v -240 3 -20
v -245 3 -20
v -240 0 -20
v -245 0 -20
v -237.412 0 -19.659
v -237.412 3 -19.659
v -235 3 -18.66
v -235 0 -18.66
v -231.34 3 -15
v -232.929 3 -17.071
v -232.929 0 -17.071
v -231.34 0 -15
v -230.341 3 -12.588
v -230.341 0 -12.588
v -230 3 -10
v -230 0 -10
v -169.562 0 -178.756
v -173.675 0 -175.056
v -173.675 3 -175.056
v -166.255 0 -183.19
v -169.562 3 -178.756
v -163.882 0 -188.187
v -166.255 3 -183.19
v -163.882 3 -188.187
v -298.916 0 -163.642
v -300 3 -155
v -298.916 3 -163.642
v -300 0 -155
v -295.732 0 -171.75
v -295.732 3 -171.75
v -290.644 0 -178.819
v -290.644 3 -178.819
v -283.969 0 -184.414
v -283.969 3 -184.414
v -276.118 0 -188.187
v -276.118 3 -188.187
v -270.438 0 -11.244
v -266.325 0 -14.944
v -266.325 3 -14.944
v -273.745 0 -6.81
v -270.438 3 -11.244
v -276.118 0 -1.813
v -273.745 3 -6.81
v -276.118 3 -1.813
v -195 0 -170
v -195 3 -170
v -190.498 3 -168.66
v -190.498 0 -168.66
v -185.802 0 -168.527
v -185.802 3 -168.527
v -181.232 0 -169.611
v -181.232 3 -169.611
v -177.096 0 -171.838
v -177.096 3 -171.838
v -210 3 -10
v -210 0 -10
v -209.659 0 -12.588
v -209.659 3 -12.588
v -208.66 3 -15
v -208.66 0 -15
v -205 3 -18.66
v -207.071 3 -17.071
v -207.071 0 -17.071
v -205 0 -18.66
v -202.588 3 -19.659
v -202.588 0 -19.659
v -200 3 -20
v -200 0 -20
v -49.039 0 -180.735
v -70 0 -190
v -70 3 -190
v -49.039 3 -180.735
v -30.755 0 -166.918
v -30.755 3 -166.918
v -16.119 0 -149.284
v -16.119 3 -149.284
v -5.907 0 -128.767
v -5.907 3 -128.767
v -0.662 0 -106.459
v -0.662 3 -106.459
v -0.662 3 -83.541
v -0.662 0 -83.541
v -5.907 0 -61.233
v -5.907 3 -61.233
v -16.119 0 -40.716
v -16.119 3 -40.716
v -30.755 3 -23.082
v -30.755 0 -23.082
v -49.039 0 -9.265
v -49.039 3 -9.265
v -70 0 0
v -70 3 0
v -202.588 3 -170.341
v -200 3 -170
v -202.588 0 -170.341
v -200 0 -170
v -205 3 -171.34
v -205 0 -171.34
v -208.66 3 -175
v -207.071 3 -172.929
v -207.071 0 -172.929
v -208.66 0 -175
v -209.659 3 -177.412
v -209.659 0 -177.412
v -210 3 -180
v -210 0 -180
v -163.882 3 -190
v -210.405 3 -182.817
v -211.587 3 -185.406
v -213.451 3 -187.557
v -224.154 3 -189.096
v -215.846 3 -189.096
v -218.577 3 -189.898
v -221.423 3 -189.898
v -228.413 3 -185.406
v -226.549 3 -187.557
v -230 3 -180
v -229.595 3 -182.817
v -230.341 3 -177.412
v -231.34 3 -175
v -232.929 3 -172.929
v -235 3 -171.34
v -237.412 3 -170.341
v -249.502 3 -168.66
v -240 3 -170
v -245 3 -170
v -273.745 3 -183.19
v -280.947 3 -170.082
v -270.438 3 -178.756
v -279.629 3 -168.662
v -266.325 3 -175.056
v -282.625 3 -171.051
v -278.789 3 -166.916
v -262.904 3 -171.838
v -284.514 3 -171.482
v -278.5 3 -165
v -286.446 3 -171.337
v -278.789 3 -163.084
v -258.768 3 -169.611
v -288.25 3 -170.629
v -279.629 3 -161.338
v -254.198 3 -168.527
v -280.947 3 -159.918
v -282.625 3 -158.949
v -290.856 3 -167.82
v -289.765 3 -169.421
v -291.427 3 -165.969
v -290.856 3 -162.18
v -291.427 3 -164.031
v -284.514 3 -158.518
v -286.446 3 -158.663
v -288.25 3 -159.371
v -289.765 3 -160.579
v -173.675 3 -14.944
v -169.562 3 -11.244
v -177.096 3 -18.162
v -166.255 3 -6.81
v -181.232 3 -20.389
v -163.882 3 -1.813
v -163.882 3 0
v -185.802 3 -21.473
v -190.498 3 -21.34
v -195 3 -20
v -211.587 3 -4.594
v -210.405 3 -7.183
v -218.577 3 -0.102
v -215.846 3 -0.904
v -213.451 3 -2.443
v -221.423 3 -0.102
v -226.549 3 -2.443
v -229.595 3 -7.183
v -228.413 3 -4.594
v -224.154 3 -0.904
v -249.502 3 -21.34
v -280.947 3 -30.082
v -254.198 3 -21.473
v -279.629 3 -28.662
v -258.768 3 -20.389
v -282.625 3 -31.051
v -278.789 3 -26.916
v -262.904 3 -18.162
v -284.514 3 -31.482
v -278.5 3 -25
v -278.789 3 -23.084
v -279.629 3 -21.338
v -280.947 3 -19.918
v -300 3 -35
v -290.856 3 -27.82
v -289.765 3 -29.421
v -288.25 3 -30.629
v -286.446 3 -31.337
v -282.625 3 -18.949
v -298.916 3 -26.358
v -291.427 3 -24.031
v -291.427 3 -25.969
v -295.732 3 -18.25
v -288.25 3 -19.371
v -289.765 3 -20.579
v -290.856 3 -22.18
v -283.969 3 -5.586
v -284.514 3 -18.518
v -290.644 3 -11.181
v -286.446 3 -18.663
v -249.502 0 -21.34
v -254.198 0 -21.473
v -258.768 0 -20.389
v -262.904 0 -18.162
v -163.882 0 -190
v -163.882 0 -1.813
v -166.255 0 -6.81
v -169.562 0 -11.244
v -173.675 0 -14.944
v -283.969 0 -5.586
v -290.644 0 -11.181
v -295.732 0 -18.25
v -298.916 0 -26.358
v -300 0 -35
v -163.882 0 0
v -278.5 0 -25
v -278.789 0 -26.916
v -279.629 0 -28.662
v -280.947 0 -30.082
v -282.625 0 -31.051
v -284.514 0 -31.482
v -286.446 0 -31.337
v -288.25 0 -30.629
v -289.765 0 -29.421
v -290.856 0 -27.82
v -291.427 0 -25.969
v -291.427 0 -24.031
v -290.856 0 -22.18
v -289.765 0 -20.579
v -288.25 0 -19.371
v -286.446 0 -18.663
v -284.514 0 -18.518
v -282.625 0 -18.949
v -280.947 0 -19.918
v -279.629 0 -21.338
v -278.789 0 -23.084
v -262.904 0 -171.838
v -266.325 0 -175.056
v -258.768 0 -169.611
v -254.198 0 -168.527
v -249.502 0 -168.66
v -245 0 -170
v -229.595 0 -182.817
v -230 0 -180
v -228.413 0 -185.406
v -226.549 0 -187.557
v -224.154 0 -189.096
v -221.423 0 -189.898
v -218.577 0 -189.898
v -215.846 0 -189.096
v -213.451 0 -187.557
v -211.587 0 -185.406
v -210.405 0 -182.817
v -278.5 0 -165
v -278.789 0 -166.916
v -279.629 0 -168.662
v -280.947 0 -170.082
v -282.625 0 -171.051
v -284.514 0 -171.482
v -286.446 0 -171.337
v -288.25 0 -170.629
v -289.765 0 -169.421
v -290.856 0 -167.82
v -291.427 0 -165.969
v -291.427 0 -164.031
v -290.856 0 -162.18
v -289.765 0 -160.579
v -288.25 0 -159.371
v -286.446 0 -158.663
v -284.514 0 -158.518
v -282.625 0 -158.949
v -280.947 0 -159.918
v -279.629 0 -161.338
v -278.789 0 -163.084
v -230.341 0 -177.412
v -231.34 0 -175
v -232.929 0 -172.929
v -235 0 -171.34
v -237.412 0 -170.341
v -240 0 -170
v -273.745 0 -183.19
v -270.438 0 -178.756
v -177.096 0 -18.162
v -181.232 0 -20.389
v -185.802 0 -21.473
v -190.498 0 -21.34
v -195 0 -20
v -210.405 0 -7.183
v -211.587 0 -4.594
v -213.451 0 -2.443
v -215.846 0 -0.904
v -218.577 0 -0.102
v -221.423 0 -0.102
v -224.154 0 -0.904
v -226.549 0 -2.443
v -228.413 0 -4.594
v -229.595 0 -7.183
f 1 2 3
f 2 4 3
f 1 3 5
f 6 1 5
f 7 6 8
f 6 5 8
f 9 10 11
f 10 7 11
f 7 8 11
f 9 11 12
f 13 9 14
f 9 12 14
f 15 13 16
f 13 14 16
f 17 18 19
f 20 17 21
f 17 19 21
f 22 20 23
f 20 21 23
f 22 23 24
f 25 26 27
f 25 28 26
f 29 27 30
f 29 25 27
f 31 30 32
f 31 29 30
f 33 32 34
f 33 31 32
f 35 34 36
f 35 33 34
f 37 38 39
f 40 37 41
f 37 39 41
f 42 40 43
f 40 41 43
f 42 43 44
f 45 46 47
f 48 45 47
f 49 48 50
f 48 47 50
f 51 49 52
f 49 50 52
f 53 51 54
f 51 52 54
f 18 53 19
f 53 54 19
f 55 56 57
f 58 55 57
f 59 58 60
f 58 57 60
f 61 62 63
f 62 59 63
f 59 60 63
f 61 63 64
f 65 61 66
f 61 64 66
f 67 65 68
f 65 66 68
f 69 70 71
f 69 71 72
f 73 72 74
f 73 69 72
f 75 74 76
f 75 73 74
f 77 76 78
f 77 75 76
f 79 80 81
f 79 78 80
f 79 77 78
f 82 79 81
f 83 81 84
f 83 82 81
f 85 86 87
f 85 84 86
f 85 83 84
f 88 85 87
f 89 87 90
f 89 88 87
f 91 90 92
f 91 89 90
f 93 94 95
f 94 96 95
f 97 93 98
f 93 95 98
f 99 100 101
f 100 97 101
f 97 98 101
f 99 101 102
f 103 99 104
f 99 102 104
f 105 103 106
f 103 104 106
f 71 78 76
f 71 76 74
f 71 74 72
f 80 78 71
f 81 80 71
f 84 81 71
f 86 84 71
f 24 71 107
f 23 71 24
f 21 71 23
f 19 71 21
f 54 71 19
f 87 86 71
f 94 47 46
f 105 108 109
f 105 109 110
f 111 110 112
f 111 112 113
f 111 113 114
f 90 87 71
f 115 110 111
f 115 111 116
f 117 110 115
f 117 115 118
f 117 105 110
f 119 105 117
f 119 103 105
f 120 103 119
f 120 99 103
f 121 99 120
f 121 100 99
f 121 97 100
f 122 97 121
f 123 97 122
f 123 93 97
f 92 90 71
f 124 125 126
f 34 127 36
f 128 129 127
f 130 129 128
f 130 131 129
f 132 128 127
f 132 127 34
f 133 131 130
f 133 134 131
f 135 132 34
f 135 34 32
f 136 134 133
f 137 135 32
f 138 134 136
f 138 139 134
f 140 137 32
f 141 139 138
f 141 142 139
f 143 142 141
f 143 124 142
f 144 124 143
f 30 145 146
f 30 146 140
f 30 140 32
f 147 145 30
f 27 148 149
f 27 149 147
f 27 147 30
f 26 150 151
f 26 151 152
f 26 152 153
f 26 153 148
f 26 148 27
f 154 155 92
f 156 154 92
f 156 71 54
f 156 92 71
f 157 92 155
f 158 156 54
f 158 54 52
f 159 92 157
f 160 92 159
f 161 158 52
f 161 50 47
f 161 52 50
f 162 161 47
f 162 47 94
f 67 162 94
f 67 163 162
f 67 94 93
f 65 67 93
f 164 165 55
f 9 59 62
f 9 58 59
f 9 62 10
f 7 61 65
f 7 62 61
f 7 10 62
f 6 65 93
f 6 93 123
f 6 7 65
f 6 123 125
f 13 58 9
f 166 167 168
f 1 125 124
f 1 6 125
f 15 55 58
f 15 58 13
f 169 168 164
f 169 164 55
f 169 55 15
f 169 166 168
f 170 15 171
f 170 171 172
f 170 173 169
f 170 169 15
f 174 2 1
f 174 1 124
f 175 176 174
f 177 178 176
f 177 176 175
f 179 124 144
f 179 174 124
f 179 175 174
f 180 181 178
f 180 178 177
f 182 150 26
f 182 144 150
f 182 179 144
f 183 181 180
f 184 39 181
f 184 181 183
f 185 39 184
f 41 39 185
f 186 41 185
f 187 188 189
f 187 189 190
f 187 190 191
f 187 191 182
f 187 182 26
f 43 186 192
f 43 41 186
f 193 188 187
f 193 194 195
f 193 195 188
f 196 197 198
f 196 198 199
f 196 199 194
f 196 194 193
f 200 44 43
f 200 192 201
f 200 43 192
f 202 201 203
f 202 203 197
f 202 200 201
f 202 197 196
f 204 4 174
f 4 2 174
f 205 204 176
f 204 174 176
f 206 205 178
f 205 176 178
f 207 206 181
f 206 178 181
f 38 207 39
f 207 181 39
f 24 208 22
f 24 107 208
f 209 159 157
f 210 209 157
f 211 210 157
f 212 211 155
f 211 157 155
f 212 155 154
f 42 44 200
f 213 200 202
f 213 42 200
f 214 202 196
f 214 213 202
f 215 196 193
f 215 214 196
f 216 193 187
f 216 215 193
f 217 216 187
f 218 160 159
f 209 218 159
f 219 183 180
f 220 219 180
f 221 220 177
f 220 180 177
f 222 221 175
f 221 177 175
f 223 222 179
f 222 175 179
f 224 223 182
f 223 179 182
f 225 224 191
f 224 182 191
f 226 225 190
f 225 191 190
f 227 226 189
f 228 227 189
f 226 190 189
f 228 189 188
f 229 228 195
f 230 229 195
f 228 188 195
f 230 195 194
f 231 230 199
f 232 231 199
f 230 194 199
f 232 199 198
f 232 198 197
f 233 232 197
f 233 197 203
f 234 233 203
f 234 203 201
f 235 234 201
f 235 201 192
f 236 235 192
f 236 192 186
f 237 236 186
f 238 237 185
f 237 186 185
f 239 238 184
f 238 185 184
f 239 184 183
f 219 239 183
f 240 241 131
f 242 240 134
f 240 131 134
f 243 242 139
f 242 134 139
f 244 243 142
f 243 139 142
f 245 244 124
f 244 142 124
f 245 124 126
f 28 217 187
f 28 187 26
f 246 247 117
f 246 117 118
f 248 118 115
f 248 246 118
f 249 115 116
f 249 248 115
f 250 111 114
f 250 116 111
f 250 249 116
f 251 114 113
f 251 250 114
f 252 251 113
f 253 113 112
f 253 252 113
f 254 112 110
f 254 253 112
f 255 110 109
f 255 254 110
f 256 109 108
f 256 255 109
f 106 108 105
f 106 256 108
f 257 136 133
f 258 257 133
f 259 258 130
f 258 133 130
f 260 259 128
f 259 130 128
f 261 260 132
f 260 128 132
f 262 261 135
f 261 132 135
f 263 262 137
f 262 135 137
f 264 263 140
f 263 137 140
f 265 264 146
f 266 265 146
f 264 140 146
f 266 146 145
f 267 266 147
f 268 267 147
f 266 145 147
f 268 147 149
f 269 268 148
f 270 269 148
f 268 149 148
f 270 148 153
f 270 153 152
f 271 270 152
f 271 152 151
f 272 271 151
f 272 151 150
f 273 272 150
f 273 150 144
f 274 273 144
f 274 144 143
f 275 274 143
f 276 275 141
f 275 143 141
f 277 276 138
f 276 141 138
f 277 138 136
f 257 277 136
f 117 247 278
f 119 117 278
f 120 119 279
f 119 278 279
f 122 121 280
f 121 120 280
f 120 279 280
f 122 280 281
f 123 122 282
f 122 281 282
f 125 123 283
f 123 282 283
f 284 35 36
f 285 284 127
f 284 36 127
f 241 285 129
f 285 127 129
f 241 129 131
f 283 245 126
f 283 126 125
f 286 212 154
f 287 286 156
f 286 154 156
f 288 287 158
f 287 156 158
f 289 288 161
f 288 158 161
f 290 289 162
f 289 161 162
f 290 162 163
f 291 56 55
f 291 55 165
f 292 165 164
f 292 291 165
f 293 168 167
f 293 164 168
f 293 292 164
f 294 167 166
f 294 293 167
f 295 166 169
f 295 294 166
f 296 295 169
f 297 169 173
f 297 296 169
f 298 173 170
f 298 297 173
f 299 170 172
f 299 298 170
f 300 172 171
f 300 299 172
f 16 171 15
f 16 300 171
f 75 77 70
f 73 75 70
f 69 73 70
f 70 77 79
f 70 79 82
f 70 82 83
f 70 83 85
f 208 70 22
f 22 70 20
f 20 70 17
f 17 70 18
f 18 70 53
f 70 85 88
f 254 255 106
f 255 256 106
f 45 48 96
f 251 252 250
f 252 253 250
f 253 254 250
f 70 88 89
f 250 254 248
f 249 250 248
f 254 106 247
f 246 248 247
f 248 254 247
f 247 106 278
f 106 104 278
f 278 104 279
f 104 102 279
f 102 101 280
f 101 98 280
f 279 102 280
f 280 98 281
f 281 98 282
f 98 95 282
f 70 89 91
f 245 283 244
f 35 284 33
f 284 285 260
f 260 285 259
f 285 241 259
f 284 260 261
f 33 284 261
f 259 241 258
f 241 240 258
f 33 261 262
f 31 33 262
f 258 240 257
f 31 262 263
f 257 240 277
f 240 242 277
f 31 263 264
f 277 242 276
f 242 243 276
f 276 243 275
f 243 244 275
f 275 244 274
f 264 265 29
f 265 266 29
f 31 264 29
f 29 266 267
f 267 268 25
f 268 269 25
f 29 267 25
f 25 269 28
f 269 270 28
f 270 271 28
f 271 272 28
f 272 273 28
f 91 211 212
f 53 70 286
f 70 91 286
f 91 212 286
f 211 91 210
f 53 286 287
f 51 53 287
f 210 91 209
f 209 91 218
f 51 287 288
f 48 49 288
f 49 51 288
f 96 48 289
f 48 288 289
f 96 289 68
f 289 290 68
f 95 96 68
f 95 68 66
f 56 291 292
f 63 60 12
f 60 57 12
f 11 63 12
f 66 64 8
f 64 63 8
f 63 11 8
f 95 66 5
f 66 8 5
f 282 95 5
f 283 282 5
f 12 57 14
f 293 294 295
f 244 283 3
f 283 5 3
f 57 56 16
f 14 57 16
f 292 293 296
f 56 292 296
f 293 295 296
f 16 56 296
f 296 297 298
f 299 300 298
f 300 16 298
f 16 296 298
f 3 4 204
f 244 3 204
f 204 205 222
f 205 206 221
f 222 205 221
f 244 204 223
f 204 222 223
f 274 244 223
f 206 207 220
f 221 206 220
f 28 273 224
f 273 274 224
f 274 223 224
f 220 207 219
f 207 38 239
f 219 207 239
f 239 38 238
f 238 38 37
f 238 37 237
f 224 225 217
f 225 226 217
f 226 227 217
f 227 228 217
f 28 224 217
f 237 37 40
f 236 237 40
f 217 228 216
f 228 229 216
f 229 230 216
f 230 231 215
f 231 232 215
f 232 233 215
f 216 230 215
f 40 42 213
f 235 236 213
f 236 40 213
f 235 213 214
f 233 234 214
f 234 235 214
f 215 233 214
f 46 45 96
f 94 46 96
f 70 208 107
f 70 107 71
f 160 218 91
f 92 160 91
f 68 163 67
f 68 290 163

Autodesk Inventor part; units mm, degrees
ref_plane "YZ Plane" through (0, 0, 0) normal (1, 0, 0) x (0, 1, 0)
ref_plane "XZ Plane" through (0, 0, 0) normal (0, 1, 0) x (-1, 0, 0)
ref_plane "XY Plane" through (0, 0, 0) normal (0, 0, 1) x (1, 0, 0)
sketch "Sketch1" plane through (0, 0, 0) normal (0, 1, 0) x (-1, 0, 0)
  line L0 (300, -35) -> (300, -155)
  line L1 (220, -190) -> (220, -190)
  line L2 (255, -180) -> (255, -180)
  line L3 (245, -170) -> (240, -170)
  line L4 (230, -180) -> (230, -180)
  line L5 (220, -190) -> (220, -190)
  line L6 (185, -180) -> (185, -180)
  line L7 (195, -170) -> (200, -170)
  line L8 (210, -180) -> (210, -180)
  arc A0 (255, -172) -> (253, -170) centre (253, -172) ccw
  arc A1 (255, -180) -> (245, -170) centre (245, -180) ccw
  arc A2 (240, -170) -> (230, -180) centre (240, -180) ccw
  arc A3 (210, -180) -> (220, -190) centre (220, -180) ccw
  arc A4 (220, -190) -> (230, -180) centre (220, -180) ccw
  arc A5 (210, -180) -> (200, -170) centre (200, -180) ccw
  arc A6 (195, -170) -> (185, -180) centre (195, -180) ccw
  arc A7 (175, -190) -> (185, -180) centre (175, -180) ccw
  line L9 (265, -190) -> (265, -190)
  arc A8 (255, -180) -> (265, -190) centre (265, -180) ccw
  line L10 (220, 0) -> (220, 0)
  line L11 (255, -10) -> (255, -10)
  line L12 (245, -20) -> (240, -20)
  line L13 (230, -10) -> (230, -10)
  line L14 (220, 0) -> (220, 0)
  line L15 (185, -10) -> (185, -10)
  line L16 (195, -20) -> (200, -20)
  line L17 (210, -10) -> (210, -10)
  arc A9 (253, -20) -> (255, -18) centre (253, -18) ccw
  arc A10 (245, -20) -> (255, -10) centre (245, -10) ccw
  arc A11 (230, -10) -> (240, -20) centre (240, -10) ccw
  arc A12 (220, 0) -> (210, -10) centre (220, -10) ccw
  arc A13 (230, -10) -> (220, 0) centre (220, -10) ccw
  arc A14 (200, -20) -> (210, -10) centre (200, -10) ccw
  arc A15 (185, -10) -> (195, -20) centre (195, -10) ccw
  arc A16 (185, -10) -> (175, 0) centre (175, -10) ccw
  line L18 (265, 0) -> (265, 0)
  arc A17 (265, 0) -> (255, -10) centre (265, -10) ccw
  arc A18 (265, -190) -> (300, -155) centre (265, -155) ccw
  arc A19 (300, -35) -> (265, 0) centre (265, -35) ccw
  line L19 (175, 0) -> (365, 0) construction
  arc A20 (70, 0) -> (70, -190) centre (99.4643, -95) ccw
  line L20 (175, 0) -> (70, 0)
  line L21 (175, -190) -> (70, -190)
  point P0 (0, 0)
  point P1 (300, -190)
  point P2 (300, 0)
  point P3 (255, -170)
  point P4 (255, -190)
  point P5 (230, -170)
  point P6 (185, -170)
  point P7 (210, -170)
  point P8 (255, -20)
  point P9 (255, 0)
  point P10 (230, -20)
  point P11 (185, -20)
  point P12 (210, -20)
  point P13 (210, -10)
  dimension "d1" = 190
  dimension "d2" = 80
  dimension "d4" = 25
  dimension "d5" = 20
  dimension "d7" = 25
  dimension "d9" = 2
  dimension "d10" = 10
  dimension "d11" = 10
  dimension "d12" = 35
extrude "Extrusion1" add sketch "Sketch1" along normal blind 3
sketch "Sketch2" plane through (0, 3, 0) normal (0, 1, 0) x (1, 0, 0)
  arc A0 (-230, 10) -> (-210, 10) centre (-220, 10) ccw projected
  line L0 (-220, 0) -> (-220, 10)
  point P0 (0, 0)
sketch "Sketch3" plane through (0, 3, 0) normal (0, 1, 0) x (1, 0, 0)
  arc A0 (-245, 20) -> (-255, 10) centre (-245, 10) ccw projected
  arc A1 (-300, 35) -> (-265, 0) centre (-265, 35) ccw projected
  arc A2 (-245, 20) -> (-276.1181, 1.8128) centre (-249.7009, -7.6718) ccw
  line L0 (-276.1181, 1.8128) -> (-248.5566, -2.5367)
  line L1 (-248.5566, -2.5367) -> (-245, 20)
  arc A3 (-230, 10) -> (-210, 10) centre (-220, 10) ccw projected
  line L2 (-220, 0) -> (-220, 190)
  arc A4 (-210, 180) -> (-230, 180) centre (-220, 180) ccw projected
  arc A5 (-163.8819, 1.8128) -> (-195, 20) centre (-190.2991, -7.6718) ccw
  line L3 (-191.4434, -2.5367) -> (-195, 20)
  line L4 (-163.8819, 1.8128) -> (-191.4434, -2.5367)
  line L5 (-220, 95) -> (-300, 95)
  line L6 (-300, 155) -> (-300, 35) projected
  arc A6 (-276.1181, 188.1872) -> (-245, 170) centre (-249.7009, 197.6718) ccw
  line L7 (-276.1181, 188.1872) -> (-248.5566, 192.5367)
  line L8 (-248.5566, 192.5367) -> (-245, 170)
  arc A7 (-195, 170) -> (-163.8819, 188.1872) centre (-190.2991, 197.6718) ccw
  line L9 (-191.4434, 192.5367) -> (-195, 170)
  line L10 (-163.8819, 188.1872) -> (-191.4434, 192.5367)
  point P0 (0, 0)
extrude "Extrusion2" cut sketch "Sketch3" against normal blind 10
sketch "Sketch4" plane through (0, 3, 0) normal (0, 1, 0) x (1, 0, 0)
  line L0 (-300, 155) -> (-300, 35) projected
  line L1 (-300, 35) -> (-285, 35)
  line L2 (-285, 35) -> (-285, 25)
  circle A0 centre (-285, 25) radius 6.5
  line L3 (-300, 155) -> (-285, 155)
  line L4 (-300, 155) -> (-285, 155) construction
  line L5 (-285, 155) -> (-285, 165)
  circle A1 centre (-285, 165) radius 6.5
  point P0 (0, 0)
  dimension "d19" = 15
  dimension "d20" = 10
  dimension "d21" = 13
  dimension "d22" = 15
  dimension "d24" = 10
  dimension "d25" = 13
extrude "Extrusion3" cut sketch "Sketch4" against normal blind 10
sketch "Sketch5" plane through (0, 3, 0) normal (0, 1, 0) x (1, 0, 0)
  line L0 (-175.3338, 0.0056) -> (-163.8819, 1.8128) projected
  line L1 (-163.8819, 1.8128) -> (-179.2892, 1.8128)
  line L2 (-179.2892, 1.8128) -> (-179.2892, -4.2644)
  line L3 (-179.2892, -4.2644) -> (-163.8819, -4.2644)
  line L4 (-163.8819, -4.2644) -> (-163.8819, 1.8128)
  arc A0 (-300, 35) -> (-276.1181, 1.8128) centre (-265, 35) ccw projected
  line L5 (-276.1181, 1.8128) -> (-262.1006, 1.8128)
  line L6 (-262.1006, 1.8128) -> (-262.1006, -4.2644)
  line L7 (-262.1006, -4.2644) -> (-276.1181, -4.2644)
  line L8 (-276.1181, -4.2644) -> (-276.1181, 1.8128)
  line L9 (-163.8819, 188.1872) -> (-175.3338, 189.9944) projected
  line L10 (-163.8819, 188.1872) -> (-177.2047, 188.1872)
  line L11 (-177.2047, 188.1872) -> (-177.2047, 195.4302)
  line L12 (-177.2047, 195.4302) -> (-163.8819, 195.4302)
  line L13 (-163.8819, 195.4302) -> (-163.8819, 188.1872)
  arc A1 (-276.1181, 188.1872) -> (-245, 170) centre (-249.7009, 197.6718) ccw projected
  line L14 (-276.1181, 188.1872) -> (-262.1006, 188.1872)
  line L15 (-262.1006, 188.1872) -> (-262.1006, 191.8087)
  line L16 (-262.1006, 191.8087) -> (-276.1181, 191.8087)
  line L17 (-276.1181, 191.8087) -> (-276.1181, 188.1872)
  point P0 (0, 0)
extrude "Extrusion4" cut sketch "Sketch5" against normal blind 10
sketch "Sketch6" plane through (0, 3, 0) normal (0, 1, 0) x (1, 0, 0)
  arc A0 (-163.8819, 1.8128) -> (-195, 20) centre (-190.2991, -7.6718) ccw projected
  line L0 (-195, 20) -> (-173.6747, 14.9436)
  line L1 (-173.6747, 14.9436) -> (-195, 20)
  line L2 (-200, 20) -> (-195, 20) projected
  arc A1 (-173.6747, 14.9436) -> (-195, 20) centre (-187.6449, 3.5225) ccw
  arc A2 (-230, 10) -> (-210, 10) centre (-220, 10) ccw projected
  line L3 (-220, 0) -> (-220, 190)
  arc A3 (-210, 180) -> (-230, 180) centre (-220, 180) ccw projected
  line L4 (-300, 155) -> (-300, 35) projected
  line L5 (-300, 95) -> (0, 95)
  arc A4 (-245, 20) -> (-276.1181, 1.8128) centre (-249.7009, -7.6718) ccw
  line L6 (-245, 20) -> (-266.3253, 14.9436)
  line L7 (-266.3253, 14.9436) -> (-245, 20)
  arc A5 (-245, 20) -> (-266.3253, 14.9436) centre (-252.3551, 3.5225) ccw
  arc A6 (-195, 170) -> (-163.8819, 188.1872) centre (-190.2991, 197.6718) ccw
  line L8 (-195, 170) -> (-173.6747, 175.0564)
  line L9 (-173.6747, 175.0564) -> (-195, 170)
  line L10 (-200, 170) -> (-195, 170)
  arc A7 (-195, 170) -> (-173.6747, 175.0564) centre (-187.6449, 186.4775) ccw
  arc A8 (-210, 180) -> (-230, 180) centre (-220, 180) ccw
  line L11 (-220, 190) -> (-220, 0)
  arc A9 (-276.1181, 188.1872) -> (-245, 170) centre (-249.7009, 197.6718) ccw
  line L12 (-245, 170) -> (-266.3253, 175.0564)
  line L13 (-266.3253, 175.0564) -> (-245, 170)
  arc A10 (-266.3253, 175.0564) -> (-245, 170) centre (-252.3551, 186.4775) ccw
  point P0 (0, 0)
extrude "Extrusion5" cut sketch "Sketch6" against normal blind 10 contours L0 A0 | A0 A1 | A4 A5 | A6 A7 | A9 A10
sketch "Sketch7" plane through (0, 3, 0) normal (0, 1, 0) x (1, 0, 0)
  point P0 (0, 0)
properties part number "Onderplaat-v1"
